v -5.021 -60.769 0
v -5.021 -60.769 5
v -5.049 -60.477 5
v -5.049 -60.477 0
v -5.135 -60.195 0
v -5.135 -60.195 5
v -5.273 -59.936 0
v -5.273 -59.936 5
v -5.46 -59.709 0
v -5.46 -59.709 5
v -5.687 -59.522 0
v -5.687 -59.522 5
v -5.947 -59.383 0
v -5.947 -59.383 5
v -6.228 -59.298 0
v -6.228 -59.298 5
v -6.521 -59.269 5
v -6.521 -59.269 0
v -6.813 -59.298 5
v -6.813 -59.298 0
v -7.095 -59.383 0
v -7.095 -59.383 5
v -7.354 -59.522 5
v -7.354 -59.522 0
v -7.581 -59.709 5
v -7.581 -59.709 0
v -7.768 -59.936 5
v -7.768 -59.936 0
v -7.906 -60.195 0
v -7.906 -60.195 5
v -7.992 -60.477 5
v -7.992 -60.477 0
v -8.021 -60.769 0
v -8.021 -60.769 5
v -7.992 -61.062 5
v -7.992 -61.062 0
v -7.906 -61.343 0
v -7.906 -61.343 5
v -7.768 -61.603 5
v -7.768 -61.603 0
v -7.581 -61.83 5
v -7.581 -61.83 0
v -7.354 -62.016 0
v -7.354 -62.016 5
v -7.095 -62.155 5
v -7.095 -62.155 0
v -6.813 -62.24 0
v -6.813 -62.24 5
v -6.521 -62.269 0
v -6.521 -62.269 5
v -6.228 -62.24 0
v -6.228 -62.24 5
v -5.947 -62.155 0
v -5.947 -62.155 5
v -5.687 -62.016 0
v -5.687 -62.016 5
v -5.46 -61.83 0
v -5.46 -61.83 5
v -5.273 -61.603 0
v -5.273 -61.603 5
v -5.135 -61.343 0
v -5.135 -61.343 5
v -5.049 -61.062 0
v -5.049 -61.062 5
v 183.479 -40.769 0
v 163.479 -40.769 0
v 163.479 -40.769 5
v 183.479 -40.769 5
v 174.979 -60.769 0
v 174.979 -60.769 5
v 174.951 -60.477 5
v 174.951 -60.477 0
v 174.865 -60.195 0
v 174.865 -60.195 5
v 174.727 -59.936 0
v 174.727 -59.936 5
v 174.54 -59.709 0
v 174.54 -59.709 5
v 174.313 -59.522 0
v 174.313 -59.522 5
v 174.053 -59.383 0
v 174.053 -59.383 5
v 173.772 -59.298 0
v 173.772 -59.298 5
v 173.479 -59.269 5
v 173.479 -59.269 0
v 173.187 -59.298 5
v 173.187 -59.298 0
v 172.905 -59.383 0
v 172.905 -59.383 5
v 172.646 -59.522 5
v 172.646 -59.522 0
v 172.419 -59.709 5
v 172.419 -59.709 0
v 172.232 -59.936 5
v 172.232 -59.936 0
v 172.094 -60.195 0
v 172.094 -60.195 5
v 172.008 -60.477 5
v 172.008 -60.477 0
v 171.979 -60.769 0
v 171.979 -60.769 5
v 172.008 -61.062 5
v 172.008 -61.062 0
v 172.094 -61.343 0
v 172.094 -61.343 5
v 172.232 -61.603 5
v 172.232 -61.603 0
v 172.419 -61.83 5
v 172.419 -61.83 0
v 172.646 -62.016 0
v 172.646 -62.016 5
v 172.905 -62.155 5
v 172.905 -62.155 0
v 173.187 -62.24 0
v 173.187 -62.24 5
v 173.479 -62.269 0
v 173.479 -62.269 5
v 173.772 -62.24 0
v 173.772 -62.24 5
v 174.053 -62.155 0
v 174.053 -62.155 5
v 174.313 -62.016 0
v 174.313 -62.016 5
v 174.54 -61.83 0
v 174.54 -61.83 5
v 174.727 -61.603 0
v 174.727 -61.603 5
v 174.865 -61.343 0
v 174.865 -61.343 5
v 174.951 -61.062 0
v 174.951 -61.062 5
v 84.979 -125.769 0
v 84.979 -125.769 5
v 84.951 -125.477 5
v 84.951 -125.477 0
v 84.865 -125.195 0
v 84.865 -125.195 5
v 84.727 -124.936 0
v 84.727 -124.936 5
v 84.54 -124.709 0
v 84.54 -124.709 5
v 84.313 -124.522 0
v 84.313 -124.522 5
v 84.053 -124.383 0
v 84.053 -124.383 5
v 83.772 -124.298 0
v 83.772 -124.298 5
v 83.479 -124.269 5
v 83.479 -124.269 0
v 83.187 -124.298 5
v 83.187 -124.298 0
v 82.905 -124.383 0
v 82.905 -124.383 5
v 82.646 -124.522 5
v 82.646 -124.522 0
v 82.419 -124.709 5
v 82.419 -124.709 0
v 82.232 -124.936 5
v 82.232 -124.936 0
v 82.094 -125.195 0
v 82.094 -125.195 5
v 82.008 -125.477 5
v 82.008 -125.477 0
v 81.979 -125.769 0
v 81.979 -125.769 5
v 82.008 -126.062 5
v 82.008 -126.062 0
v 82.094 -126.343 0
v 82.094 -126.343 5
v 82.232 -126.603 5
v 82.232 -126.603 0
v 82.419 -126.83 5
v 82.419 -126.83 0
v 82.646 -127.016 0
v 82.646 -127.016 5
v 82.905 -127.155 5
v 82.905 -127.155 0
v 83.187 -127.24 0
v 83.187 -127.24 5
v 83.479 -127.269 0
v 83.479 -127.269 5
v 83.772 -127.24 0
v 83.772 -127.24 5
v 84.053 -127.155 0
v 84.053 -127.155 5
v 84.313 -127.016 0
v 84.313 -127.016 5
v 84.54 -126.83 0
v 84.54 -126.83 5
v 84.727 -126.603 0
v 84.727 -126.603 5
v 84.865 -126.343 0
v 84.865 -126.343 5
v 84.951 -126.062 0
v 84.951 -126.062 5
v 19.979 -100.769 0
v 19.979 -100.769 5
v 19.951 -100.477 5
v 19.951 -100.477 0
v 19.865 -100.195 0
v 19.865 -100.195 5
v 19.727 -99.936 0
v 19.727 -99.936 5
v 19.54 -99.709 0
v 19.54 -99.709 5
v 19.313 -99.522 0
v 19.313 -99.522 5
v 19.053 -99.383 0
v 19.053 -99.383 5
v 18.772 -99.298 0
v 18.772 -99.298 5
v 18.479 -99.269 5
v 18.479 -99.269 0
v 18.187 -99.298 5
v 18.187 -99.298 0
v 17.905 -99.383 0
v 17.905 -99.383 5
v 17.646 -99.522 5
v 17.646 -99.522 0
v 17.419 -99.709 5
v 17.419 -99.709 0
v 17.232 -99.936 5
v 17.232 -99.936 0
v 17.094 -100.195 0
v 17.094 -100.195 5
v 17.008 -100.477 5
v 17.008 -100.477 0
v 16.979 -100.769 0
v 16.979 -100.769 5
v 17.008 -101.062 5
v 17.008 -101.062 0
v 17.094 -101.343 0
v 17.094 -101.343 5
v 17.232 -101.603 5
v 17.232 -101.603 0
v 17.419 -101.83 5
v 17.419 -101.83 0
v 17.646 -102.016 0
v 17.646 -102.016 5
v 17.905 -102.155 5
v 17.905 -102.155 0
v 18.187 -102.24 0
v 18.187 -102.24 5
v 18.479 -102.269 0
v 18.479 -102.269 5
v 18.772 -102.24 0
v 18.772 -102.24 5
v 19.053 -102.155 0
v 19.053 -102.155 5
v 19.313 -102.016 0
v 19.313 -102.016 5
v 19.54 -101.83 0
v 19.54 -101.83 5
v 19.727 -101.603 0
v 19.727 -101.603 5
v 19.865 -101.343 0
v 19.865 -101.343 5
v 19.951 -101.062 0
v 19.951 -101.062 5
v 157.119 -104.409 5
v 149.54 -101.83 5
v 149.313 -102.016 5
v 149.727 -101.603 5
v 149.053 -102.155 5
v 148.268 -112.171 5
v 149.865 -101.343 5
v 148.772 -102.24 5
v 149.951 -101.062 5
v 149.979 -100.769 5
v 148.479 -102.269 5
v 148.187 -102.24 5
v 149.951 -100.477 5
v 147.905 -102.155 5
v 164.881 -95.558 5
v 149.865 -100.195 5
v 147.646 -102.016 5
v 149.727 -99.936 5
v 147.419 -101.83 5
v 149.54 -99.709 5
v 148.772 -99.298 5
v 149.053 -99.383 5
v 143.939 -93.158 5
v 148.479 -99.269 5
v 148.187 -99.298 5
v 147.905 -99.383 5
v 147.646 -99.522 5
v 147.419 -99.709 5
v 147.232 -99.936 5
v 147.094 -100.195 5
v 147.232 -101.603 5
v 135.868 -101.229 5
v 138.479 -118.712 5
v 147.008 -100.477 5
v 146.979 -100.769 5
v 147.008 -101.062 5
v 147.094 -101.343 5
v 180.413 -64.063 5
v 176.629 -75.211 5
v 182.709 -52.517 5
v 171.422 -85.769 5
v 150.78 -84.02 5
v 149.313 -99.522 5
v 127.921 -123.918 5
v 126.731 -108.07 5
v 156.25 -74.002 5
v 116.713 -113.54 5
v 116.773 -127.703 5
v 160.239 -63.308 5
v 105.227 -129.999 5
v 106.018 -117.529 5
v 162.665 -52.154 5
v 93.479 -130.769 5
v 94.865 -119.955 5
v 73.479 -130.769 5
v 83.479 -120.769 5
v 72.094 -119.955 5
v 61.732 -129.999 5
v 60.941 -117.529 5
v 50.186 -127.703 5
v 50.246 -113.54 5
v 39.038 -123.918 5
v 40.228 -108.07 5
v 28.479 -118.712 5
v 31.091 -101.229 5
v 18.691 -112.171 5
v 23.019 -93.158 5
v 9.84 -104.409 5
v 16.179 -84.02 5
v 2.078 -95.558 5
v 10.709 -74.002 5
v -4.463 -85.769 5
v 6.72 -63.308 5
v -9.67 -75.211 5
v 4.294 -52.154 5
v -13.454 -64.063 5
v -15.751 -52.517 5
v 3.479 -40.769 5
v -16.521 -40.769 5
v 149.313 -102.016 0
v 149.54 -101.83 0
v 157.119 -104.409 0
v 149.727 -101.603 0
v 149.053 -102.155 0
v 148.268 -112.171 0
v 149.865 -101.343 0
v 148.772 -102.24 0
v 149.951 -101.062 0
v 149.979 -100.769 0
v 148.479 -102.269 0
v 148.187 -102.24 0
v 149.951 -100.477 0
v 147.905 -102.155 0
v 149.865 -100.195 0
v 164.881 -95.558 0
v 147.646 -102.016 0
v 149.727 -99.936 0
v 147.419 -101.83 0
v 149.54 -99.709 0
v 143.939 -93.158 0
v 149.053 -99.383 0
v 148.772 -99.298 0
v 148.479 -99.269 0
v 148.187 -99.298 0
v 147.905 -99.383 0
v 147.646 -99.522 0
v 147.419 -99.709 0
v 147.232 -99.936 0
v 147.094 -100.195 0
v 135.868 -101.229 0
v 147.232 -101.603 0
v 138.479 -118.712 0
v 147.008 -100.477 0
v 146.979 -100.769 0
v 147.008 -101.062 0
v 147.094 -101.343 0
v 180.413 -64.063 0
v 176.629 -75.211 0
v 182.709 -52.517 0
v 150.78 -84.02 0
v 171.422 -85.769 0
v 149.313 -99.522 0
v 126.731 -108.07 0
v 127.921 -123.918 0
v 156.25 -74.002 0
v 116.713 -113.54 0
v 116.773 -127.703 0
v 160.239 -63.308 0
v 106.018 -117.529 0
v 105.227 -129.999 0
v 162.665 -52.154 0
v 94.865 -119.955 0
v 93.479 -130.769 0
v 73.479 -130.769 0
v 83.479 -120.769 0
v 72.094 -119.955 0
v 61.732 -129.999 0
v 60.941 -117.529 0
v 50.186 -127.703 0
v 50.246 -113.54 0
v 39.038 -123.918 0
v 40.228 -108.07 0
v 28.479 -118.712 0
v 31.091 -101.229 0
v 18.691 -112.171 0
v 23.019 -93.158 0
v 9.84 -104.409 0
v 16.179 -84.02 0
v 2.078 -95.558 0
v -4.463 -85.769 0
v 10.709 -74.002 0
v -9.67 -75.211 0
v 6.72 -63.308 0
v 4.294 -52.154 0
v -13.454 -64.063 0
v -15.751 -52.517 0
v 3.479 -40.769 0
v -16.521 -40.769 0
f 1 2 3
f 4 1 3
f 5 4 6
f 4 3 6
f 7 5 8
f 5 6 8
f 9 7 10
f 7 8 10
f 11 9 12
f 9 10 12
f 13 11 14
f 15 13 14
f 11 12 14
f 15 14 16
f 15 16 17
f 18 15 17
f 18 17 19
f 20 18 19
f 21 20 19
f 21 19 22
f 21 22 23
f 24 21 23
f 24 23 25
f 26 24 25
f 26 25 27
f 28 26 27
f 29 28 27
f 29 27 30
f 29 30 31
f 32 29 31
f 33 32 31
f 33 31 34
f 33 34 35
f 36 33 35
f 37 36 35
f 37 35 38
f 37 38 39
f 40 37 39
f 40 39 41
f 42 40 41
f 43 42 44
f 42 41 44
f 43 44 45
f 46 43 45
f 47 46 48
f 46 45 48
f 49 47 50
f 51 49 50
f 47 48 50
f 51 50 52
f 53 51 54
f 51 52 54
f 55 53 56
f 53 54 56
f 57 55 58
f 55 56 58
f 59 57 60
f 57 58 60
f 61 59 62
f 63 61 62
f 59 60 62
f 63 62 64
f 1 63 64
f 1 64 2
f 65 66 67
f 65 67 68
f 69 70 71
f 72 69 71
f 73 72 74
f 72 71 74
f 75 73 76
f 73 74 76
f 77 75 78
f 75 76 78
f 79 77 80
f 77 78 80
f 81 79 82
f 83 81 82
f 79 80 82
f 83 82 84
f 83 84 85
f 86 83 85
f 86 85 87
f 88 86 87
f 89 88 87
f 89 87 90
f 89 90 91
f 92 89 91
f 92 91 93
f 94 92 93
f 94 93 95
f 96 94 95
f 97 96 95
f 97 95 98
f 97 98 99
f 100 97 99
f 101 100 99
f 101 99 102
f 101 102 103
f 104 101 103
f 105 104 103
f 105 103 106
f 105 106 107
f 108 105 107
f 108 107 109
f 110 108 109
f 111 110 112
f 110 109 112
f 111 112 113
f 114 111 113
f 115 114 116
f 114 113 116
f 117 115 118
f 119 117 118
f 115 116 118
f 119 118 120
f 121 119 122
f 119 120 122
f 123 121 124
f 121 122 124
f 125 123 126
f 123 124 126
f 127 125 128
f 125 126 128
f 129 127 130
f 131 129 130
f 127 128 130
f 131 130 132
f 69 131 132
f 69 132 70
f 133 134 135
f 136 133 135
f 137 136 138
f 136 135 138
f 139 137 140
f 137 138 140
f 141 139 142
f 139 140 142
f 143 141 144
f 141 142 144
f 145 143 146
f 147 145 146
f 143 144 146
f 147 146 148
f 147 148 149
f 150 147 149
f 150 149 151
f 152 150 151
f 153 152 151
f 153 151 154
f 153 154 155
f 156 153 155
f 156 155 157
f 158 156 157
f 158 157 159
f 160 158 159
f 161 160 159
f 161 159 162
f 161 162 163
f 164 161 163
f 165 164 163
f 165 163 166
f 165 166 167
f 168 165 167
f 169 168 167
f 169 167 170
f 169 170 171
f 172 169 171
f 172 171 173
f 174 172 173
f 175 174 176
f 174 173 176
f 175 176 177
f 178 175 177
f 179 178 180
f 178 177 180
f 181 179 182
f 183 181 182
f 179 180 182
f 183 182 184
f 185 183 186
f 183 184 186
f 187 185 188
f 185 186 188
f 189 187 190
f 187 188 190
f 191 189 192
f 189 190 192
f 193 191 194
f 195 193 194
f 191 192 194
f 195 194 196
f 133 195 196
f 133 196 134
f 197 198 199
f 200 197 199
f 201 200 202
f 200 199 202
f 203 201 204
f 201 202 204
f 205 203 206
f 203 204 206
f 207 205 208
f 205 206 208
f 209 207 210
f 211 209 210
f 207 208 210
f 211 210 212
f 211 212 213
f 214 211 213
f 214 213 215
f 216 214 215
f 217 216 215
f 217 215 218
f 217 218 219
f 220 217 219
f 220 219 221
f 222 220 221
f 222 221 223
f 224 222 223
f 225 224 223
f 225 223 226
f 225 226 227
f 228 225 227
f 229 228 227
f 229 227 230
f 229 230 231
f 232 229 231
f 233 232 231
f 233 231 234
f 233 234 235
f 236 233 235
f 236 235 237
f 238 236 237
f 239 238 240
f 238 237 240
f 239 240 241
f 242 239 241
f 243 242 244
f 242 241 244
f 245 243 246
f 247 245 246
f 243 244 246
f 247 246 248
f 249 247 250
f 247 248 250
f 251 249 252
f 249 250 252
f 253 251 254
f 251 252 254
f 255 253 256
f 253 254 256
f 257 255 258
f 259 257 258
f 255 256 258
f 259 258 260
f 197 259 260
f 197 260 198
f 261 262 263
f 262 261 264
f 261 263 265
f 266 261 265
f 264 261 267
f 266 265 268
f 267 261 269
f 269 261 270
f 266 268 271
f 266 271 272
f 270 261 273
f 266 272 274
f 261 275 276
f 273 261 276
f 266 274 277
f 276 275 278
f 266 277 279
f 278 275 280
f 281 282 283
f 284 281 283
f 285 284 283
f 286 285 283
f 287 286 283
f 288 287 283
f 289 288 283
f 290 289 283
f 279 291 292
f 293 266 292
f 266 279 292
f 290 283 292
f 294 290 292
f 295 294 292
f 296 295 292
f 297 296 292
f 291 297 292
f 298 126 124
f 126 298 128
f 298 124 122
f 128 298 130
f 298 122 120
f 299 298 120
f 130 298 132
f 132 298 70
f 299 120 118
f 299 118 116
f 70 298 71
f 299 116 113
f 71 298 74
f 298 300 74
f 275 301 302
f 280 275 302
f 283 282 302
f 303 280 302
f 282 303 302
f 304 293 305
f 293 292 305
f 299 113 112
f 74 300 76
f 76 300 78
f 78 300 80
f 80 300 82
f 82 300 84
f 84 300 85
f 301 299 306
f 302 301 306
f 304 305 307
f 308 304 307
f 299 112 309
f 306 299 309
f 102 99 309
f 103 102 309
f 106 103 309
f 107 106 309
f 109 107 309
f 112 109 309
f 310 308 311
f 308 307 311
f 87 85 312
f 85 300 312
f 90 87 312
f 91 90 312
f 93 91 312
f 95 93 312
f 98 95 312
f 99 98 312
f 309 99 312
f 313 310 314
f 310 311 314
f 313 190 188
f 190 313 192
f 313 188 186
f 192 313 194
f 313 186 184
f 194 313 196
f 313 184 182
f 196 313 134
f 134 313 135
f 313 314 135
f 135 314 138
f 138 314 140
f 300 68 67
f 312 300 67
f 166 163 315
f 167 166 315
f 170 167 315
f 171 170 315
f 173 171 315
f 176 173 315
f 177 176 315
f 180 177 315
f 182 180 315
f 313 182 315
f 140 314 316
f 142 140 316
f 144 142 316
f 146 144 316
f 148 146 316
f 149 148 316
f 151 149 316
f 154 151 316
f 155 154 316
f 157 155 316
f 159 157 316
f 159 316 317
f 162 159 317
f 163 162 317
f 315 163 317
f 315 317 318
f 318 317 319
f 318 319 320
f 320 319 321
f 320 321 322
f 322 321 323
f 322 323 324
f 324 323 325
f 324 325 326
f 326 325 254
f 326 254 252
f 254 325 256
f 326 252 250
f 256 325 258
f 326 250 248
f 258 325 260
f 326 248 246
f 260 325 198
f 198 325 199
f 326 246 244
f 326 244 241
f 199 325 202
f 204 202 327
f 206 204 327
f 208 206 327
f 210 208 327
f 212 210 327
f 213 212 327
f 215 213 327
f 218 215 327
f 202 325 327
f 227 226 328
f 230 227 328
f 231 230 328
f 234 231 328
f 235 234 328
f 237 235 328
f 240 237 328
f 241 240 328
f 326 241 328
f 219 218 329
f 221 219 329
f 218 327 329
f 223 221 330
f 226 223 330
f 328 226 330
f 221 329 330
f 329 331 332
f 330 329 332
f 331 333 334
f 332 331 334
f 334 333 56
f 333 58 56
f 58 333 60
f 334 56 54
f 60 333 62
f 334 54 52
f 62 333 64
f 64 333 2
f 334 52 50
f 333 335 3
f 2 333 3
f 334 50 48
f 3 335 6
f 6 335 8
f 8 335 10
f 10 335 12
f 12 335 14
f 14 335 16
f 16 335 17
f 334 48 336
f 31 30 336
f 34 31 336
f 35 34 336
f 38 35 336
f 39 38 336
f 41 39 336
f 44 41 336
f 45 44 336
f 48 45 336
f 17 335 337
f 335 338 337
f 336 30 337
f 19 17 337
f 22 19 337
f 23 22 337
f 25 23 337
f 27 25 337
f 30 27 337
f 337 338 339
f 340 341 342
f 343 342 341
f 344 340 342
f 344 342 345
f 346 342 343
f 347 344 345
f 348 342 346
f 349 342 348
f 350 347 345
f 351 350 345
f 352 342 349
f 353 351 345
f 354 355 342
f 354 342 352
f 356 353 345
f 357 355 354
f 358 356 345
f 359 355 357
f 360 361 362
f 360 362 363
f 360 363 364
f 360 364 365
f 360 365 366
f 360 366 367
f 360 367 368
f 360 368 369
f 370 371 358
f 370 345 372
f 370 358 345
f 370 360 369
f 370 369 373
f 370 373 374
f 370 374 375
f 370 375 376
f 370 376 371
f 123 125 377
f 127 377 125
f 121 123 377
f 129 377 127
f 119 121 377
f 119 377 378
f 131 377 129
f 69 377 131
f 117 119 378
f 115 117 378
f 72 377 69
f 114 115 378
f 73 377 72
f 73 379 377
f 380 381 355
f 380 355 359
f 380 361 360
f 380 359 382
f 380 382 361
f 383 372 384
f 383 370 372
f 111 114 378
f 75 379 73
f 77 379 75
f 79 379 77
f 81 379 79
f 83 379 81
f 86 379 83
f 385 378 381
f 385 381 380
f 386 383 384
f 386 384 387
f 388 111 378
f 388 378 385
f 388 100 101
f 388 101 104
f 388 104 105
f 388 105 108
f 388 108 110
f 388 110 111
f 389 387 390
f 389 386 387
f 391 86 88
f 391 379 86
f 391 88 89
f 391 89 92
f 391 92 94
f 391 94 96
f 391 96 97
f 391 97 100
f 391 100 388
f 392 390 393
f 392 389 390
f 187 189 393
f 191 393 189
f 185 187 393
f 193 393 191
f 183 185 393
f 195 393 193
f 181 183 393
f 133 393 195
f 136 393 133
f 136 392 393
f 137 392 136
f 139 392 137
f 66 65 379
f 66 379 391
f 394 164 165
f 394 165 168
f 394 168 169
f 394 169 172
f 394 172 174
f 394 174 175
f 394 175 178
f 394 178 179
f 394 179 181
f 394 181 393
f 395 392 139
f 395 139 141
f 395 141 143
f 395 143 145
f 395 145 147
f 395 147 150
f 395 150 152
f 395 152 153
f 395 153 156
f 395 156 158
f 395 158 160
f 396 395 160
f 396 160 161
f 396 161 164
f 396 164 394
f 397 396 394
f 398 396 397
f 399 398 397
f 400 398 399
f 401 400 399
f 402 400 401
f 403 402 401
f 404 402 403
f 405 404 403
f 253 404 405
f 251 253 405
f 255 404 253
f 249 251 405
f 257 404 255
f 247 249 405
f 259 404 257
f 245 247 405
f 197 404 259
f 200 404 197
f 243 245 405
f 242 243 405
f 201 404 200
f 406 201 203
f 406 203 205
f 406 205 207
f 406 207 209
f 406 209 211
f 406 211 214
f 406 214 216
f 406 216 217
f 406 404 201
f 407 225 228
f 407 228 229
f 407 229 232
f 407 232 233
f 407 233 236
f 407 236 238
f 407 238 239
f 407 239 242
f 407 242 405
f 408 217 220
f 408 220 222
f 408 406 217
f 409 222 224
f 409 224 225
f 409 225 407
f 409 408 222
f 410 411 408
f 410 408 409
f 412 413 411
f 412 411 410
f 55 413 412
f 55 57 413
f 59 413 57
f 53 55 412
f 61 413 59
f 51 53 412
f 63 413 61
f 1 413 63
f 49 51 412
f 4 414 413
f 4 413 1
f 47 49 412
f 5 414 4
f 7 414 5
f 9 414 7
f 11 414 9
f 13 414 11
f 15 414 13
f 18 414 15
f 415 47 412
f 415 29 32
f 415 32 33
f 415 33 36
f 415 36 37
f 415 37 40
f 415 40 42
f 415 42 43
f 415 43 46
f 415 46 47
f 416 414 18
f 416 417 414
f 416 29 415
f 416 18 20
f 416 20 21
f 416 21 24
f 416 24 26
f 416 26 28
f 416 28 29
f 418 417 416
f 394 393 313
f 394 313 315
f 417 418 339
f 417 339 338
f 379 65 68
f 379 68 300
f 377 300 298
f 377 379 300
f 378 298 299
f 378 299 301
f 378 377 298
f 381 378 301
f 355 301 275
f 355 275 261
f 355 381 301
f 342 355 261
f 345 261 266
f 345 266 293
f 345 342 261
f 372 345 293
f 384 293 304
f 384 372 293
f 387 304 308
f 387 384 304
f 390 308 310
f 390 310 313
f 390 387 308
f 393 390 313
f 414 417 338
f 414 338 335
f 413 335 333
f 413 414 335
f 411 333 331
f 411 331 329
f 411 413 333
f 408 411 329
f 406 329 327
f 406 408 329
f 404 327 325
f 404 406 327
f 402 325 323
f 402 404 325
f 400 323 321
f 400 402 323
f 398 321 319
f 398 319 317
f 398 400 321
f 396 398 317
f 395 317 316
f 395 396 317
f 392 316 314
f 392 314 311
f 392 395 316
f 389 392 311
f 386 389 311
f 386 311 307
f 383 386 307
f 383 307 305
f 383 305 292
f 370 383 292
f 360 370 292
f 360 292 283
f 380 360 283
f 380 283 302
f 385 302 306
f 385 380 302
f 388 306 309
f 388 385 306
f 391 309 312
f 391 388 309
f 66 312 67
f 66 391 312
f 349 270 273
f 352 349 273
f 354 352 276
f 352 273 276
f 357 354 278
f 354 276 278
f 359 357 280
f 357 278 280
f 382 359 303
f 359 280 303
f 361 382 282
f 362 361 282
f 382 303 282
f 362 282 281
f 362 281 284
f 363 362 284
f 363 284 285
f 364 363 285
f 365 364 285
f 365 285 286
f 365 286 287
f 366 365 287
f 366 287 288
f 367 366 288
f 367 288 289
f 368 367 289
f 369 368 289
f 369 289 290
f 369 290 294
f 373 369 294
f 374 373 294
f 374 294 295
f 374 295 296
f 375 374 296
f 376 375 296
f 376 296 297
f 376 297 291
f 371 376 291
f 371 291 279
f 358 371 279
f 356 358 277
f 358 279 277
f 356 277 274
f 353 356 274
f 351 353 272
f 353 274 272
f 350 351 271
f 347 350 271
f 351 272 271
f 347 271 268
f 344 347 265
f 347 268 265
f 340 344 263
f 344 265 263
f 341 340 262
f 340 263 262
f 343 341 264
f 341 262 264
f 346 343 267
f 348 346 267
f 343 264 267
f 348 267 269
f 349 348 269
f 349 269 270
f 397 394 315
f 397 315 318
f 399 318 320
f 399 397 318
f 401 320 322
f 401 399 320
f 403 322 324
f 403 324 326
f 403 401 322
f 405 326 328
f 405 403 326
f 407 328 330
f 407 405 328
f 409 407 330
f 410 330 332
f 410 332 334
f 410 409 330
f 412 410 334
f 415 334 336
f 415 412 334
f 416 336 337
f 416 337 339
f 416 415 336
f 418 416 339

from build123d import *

# Parameters (mm, degrees)
RESSALTO_EXTRUS_O1_DEPTH = 5
ESBO_O2_R                = 1.5
CORTE_EXTRUS_O1_DEPTH    = 10


with BuildPart() as part:
    # Esboço1 → Ressalto-extrusão1 (new body)
    with BuildSketch(Plane.XY):
        with BuildLine():
            Line((-16.520541228, -40.769230769), (3.479458772, -40.769230769))
            ThreePointArc((3.479458772, -40.769230769), (83.479458772, -120.769230769), (163.479458772, -40.769230769))
            Line((163.479458772, -40.769230769), (183.479458772, -40.769230769))
            ThreePointArc((183.479458772, -40.769230769), (157.119069078, -104.408841076), (93.479458772, -130.769230769))
            Line((93.479458772, -130.769230769), (73.479458772, -130.769230769))
            ThreePointArc((73.479458772, -130.769230769), (9.839848465, -104.408841076), (-16.520541228, -40.769230769))
        make_face()
    extrude(amount=RESSALTO_EXTRUS_O1_DEPTH)

    # Esboço2 → Corte-extrusão1 (cut)
    with BuildSketch(Plane.XY.offset(5)):
        with Locations((83.479458772, -125.769230769)):
            Circle(ESBO_O2_R)
        with Locations((148.479458772, -100.769230769)):
            Circle(ESBO_O2_R)
        with Locations((173.479458772, -60.769230769)):
            Circle(ESBO_O2_R)
        with Locations((-6.520541228, -60.769230769)):
            Circle(ESBO_O2_R)
        with Locations((18.479458772, -100.769230769)):
            Circle(ESBO_O2_R)
    extrude(amount=-CORTE_EXTRUS_O1_DEPTH, mode=Mode.SUBTRACT)


solid = part.part
